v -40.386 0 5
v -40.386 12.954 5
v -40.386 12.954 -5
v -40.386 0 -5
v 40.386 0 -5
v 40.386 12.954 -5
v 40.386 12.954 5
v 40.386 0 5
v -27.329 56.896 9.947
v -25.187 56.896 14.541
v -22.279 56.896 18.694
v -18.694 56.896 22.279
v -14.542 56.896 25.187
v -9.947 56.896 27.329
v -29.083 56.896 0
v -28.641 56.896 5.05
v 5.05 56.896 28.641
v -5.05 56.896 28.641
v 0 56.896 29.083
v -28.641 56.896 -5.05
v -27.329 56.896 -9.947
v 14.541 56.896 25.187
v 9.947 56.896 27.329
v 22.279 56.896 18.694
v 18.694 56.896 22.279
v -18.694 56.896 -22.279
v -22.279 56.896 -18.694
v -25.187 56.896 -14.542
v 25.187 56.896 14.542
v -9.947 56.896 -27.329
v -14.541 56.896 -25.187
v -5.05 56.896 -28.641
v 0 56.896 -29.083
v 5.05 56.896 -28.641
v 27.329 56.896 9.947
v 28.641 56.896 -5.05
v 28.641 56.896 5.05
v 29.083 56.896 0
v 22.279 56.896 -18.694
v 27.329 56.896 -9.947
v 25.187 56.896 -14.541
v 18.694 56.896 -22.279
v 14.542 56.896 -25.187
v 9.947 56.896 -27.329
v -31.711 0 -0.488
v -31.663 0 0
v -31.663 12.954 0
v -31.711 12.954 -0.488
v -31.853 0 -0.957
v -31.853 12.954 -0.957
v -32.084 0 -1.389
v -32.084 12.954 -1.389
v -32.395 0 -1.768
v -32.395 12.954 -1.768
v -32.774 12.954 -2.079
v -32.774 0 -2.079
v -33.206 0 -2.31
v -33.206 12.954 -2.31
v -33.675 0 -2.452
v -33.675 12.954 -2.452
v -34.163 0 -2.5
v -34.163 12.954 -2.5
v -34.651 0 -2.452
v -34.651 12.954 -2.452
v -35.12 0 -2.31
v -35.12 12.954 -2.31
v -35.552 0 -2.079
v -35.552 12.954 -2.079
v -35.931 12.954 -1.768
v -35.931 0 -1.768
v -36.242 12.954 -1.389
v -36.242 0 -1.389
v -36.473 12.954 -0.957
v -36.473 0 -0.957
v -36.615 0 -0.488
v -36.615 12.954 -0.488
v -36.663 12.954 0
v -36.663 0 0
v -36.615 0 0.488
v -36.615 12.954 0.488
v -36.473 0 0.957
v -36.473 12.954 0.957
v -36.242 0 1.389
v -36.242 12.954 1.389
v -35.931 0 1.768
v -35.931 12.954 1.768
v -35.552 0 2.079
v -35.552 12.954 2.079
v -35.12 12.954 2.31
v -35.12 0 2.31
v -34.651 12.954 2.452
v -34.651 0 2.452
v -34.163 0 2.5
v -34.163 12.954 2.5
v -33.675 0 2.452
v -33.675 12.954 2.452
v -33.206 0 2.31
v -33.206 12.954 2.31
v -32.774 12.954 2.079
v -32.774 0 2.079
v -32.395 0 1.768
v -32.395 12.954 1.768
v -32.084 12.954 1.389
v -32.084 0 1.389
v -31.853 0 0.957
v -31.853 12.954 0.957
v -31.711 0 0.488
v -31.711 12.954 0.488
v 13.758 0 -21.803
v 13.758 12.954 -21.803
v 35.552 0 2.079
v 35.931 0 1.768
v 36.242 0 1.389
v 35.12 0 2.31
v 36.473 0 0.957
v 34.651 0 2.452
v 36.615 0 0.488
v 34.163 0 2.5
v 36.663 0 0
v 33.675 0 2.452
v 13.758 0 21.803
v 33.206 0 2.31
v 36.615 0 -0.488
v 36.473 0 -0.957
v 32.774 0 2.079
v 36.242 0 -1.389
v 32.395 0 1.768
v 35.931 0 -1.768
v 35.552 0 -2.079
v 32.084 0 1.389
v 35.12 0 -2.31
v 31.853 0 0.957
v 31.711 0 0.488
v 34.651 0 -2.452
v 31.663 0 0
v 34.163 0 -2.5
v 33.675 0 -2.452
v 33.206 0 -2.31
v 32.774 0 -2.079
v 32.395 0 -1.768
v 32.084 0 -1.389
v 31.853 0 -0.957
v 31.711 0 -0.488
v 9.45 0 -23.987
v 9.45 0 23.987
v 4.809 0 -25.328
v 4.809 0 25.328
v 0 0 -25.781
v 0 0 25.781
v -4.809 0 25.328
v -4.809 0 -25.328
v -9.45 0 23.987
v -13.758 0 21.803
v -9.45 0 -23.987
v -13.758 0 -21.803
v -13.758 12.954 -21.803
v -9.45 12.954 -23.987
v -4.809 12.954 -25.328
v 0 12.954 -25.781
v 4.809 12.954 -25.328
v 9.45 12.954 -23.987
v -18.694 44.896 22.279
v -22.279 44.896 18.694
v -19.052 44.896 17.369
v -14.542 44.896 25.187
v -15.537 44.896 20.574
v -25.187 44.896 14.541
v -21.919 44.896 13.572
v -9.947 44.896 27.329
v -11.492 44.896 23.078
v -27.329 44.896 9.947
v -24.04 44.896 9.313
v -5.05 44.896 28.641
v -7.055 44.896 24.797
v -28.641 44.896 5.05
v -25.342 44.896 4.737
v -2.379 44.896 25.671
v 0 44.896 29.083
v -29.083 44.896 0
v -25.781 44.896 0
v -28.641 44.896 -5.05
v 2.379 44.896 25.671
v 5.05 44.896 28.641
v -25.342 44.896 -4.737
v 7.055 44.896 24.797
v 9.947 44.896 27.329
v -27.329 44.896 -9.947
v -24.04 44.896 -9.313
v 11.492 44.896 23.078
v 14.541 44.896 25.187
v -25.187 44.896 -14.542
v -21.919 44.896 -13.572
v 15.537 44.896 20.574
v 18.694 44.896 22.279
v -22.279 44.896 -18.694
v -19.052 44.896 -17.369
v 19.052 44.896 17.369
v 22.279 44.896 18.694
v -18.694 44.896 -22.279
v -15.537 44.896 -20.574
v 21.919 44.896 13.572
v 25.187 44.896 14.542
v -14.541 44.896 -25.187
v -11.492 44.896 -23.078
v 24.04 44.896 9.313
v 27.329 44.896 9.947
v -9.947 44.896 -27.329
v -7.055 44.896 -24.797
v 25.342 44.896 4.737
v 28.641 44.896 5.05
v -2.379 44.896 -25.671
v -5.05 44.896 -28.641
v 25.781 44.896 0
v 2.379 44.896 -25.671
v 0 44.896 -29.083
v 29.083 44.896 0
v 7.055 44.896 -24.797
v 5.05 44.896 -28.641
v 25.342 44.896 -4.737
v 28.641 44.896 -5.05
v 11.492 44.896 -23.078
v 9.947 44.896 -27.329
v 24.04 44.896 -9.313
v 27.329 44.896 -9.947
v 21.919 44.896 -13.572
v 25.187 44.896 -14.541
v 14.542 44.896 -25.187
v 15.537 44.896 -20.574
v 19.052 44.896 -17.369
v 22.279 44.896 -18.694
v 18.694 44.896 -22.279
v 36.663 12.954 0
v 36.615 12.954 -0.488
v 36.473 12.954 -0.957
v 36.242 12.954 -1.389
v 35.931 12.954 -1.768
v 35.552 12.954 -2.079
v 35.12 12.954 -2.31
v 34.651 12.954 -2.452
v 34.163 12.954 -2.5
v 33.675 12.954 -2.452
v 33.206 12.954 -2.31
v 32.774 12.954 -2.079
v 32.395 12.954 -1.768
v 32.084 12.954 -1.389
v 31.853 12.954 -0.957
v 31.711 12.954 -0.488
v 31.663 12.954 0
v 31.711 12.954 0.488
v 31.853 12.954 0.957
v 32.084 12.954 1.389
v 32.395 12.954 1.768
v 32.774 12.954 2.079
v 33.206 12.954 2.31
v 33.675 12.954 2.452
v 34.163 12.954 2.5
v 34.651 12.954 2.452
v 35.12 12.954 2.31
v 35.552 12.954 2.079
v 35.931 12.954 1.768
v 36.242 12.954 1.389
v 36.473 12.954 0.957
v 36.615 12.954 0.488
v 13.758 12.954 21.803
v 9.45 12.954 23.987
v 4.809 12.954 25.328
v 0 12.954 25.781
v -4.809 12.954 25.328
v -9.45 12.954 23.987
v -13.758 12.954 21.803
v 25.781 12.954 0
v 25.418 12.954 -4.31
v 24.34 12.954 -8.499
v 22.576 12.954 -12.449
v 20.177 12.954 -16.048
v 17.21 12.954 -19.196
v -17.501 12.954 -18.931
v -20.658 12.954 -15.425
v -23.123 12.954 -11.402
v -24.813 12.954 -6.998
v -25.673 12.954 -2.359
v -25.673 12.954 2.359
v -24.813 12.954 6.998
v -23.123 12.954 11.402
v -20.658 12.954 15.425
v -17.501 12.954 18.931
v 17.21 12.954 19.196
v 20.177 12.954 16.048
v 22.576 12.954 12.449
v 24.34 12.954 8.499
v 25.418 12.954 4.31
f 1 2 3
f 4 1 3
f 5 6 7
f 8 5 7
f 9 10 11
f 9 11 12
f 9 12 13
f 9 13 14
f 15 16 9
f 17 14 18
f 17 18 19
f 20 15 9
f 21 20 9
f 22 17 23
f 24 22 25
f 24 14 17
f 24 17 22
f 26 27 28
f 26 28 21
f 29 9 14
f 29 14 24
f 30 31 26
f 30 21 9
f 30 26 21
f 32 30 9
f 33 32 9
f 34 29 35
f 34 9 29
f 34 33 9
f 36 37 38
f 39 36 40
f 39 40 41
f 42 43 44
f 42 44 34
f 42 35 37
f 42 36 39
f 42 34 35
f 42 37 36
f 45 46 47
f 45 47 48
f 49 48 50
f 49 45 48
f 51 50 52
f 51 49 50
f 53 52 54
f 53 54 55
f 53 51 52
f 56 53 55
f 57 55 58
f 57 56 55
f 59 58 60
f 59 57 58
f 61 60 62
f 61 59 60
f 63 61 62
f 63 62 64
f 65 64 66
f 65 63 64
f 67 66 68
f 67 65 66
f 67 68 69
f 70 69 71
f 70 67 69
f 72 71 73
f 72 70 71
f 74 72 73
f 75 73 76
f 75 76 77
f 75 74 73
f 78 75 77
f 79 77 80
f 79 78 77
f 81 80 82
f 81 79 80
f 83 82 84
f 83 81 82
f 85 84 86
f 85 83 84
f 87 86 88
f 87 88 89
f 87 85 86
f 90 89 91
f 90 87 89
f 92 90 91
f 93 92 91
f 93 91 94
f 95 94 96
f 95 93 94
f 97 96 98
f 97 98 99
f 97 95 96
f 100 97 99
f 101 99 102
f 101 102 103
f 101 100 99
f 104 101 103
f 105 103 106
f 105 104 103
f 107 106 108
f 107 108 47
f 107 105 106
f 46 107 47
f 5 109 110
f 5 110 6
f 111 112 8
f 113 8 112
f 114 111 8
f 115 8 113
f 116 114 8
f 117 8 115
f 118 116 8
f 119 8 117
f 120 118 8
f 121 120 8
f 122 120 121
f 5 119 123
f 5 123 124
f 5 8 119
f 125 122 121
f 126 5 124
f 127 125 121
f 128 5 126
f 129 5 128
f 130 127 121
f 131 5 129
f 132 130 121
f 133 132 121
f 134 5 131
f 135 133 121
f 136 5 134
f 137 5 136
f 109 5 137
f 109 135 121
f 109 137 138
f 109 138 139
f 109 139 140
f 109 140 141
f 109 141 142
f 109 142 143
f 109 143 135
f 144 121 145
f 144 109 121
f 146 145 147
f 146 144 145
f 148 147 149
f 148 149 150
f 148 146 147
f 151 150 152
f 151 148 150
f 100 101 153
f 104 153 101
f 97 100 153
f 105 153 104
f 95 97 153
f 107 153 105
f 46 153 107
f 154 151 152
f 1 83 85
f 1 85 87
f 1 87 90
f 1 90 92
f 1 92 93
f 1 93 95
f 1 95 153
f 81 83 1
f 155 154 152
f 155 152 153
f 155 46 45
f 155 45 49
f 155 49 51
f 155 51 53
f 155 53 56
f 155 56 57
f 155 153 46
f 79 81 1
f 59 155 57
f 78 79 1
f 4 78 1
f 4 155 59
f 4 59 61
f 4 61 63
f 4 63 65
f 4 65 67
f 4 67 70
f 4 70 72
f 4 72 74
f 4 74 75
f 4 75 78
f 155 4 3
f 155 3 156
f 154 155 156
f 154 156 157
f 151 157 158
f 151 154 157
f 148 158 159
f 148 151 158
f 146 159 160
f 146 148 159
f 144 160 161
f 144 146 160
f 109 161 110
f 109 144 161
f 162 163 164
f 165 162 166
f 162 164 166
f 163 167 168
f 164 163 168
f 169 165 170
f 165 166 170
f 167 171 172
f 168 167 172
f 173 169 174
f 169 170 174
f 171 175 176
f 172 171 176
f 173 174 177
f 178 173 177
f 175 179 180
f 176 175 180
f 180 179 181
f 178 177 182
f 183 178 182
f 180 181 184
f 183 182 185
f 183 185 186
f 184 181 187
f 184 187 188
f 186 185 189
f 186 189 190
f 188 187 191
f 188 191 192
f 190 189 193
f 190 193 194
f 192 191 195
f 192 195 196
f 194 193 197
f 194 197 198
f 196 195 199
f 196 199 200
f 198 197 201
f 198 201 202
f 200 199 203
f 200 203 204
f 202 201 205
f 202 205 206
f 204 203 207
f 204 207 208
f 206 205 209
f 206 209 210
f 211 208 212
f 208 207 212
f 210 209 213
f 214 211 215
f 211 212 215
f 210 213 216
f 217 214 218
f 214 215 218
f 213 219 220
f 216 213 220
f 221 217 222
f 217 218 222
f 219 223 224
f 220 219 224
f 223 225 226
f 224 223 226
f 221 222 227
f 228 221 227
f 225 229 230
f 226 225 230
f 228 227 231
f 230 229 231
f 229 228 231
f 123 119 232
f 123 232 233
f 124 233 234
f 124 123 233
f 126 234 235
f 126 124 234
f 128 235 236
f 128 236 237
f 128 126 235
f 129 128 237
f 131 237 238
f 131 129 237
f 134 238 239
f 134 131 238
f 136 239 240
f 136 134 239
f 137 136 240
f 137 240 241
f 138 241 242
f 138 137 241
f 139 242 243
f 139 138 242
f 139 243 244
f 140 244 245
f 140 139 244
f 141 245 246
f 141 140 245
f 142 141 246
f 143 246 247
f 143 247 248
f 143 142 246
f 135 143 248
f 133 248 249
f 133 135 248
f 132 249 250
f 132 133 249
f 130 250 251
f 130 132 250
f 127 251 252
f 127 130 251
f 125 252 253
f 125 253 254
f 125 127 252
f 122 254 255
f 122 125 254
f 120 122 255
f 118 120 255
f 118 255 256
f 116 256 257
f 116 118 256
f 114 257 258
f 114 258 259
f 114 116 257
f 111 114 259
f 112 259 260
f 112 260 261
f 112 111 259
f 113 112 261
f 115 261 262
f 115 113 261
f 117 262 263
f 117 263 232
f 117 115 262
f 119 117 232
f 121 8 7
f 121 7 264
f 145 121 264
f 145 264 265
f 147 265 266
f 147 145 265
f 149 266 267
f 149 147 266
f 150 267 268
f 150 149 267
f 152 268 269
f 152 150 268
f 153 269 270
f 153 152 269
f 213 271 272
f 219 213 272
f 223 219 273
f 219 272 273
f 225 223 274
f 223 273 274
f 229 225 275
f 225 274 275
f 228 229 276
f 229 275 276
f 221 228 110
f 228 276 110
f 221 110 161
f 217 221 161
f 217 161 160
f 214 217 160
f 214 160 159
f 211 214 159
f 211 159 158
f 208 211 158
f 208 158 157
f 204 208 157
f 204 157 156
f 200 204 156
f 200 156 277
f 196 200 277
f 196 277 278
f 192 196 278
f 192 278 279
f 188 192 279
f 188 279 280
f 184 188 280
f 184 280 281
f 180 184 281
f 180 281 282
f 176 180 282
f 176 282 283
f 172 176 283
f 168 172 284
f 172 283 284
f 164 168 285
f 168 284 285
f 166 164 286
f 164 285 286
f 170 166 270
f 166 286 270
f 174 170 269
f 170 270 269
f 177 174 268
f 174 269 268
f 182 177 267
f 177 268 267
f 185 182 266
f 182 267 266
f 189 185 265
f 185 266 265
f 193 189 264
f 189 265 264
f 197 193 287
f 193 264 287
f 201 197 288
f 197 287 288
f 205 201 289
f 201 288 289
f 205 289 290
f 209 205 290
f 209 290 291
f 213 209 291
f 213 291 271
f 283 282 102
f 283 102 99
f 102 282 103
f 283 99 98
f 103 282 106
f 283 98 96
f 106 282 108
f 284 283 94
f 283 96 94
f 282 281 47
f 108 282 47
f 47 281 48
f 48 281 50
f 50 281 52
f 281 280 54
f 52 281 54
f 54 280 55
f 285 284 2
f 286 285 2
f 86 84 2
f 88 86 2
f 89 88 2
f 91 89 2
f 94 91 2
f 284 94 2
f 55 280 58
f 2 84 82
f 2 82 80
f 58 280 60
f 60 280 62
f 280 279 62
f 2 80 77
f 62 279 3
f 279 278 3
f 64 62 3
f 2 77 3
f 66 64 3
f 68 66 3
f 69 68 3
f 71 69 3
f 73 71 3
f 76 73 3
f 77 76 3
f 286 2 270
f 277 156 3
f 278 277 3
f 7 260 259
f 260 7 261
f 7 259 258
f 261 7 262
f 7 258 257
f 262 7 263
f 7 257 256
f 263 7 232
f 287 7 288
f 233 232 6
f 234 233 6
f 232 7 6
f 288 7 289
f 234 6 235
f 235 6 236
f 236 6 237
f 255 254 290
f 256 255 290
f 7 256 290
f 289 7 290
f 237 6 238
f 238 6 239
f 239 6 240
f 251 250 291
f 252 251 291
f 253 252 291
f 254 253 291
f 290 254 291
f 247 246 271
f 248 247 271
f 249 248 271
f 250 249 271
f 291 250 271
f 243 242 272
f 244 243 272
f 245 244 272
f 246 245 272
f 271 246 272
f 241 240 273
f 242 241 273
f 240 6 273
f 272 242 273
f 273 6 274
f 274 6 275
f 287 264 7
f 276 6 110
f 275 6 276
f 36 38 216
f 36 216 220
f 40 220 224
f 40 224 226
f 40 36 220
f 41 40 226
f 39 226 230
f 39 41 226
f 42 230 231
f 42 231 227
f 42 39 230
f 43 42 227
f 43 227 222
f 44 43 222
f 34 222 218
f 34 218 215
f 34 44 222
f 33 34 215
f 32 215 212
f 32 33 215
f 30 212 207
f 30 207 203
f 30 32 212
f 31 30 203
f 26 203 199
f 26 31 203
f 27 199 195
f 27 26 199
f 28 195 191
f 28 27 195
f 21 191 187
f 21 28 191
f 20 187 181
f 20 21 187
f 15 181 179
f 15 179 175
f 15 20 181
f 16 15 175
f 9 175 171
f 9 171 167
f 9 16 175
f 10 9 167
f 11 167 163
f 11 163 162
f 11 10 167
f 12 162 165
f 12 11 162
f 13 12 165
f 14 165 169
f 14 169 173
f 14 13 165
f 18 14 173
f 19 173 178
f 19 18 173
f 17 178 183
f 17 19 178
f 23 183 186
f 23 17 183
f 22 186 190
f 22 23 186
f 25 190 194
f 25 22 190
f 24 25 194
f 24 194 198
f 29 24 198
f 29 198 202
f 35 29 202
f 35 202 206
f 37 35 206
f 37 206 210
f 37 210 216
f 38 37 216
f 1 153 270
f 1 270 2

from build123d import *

# Parameters (mm, degrees)
SKETCH1_R           = 2.5
BOSS_EXTRUDE1_DEPTH = 12.954
SKETCH2_R           = 25.781
BOSS_EXTRUDE2_DEPTH = 43.942
SKETCH3_R           = 29.083
BOSS_EXTRUDE3_DEPTH = 12


with BuildPart() as part:
    # Sketch1 → Boss-Extrude1 (new body)
    with BuildSketch(Plane(origin=(0, 0, 0), x_dir=(1, 0, 0), z_dir=(0, 1, 0))):
        with BuildLine():
            Line((-40.386, -5), (-40.386, 5))
            Line((-40.386, 5), (-13.758365761, 21.802920277))
            ThreePointArc((-13.758365761, 21.802920277), (0, 25.781), (13.758365761, 21.802920277))
            Line((13.758365761, 21.802920277), (40.386, 5))
            Line((40.386, 5), (40.386, -5))
            Line((40.386, -5), (13.758365761, -21.802920277))
            ThreePointArc((13.758365761, -21.802920277), (0, -25.781), (-13.758365761, -21.802920277))
            Line((-13.758365761, -21.802920277), (-40.386, -5))
        make_face()
        with Locations((-34.163, 0)):
            Circle(SKETCH1_R, mode=Mode.SUBTRACT)
        with Locations((34.163, 0)):
            Circle(SKETCH1_R, mode=Mode.SUBTRACT)
    extrude(amount=BOSS_EXTRUDE1_DEPTH)

    # Sketch2 → Boss-Extrude2 (add)
    with BuildSketch(Plane(origin=(0, 12.954, 0), x_dir=(1, 0, 0), z_dir=(0, 1, 0))):
        Circle(SKETCH2_R)
    extrude(amount=BOSS_EXTRUDE2_DEPTH)

    # Sketch3 → Boss-Extrude3 (add)
    with BuildSketch(Plane(origin=(0, 56.896, 0), x_dir=(1, 0, 0), z_dir=(0, 1, 0))):
        Circle(SKETCH3_R)
    extrude(amount=-BOSS_EXTRUDE3_DEPTH)


solid = part.part
